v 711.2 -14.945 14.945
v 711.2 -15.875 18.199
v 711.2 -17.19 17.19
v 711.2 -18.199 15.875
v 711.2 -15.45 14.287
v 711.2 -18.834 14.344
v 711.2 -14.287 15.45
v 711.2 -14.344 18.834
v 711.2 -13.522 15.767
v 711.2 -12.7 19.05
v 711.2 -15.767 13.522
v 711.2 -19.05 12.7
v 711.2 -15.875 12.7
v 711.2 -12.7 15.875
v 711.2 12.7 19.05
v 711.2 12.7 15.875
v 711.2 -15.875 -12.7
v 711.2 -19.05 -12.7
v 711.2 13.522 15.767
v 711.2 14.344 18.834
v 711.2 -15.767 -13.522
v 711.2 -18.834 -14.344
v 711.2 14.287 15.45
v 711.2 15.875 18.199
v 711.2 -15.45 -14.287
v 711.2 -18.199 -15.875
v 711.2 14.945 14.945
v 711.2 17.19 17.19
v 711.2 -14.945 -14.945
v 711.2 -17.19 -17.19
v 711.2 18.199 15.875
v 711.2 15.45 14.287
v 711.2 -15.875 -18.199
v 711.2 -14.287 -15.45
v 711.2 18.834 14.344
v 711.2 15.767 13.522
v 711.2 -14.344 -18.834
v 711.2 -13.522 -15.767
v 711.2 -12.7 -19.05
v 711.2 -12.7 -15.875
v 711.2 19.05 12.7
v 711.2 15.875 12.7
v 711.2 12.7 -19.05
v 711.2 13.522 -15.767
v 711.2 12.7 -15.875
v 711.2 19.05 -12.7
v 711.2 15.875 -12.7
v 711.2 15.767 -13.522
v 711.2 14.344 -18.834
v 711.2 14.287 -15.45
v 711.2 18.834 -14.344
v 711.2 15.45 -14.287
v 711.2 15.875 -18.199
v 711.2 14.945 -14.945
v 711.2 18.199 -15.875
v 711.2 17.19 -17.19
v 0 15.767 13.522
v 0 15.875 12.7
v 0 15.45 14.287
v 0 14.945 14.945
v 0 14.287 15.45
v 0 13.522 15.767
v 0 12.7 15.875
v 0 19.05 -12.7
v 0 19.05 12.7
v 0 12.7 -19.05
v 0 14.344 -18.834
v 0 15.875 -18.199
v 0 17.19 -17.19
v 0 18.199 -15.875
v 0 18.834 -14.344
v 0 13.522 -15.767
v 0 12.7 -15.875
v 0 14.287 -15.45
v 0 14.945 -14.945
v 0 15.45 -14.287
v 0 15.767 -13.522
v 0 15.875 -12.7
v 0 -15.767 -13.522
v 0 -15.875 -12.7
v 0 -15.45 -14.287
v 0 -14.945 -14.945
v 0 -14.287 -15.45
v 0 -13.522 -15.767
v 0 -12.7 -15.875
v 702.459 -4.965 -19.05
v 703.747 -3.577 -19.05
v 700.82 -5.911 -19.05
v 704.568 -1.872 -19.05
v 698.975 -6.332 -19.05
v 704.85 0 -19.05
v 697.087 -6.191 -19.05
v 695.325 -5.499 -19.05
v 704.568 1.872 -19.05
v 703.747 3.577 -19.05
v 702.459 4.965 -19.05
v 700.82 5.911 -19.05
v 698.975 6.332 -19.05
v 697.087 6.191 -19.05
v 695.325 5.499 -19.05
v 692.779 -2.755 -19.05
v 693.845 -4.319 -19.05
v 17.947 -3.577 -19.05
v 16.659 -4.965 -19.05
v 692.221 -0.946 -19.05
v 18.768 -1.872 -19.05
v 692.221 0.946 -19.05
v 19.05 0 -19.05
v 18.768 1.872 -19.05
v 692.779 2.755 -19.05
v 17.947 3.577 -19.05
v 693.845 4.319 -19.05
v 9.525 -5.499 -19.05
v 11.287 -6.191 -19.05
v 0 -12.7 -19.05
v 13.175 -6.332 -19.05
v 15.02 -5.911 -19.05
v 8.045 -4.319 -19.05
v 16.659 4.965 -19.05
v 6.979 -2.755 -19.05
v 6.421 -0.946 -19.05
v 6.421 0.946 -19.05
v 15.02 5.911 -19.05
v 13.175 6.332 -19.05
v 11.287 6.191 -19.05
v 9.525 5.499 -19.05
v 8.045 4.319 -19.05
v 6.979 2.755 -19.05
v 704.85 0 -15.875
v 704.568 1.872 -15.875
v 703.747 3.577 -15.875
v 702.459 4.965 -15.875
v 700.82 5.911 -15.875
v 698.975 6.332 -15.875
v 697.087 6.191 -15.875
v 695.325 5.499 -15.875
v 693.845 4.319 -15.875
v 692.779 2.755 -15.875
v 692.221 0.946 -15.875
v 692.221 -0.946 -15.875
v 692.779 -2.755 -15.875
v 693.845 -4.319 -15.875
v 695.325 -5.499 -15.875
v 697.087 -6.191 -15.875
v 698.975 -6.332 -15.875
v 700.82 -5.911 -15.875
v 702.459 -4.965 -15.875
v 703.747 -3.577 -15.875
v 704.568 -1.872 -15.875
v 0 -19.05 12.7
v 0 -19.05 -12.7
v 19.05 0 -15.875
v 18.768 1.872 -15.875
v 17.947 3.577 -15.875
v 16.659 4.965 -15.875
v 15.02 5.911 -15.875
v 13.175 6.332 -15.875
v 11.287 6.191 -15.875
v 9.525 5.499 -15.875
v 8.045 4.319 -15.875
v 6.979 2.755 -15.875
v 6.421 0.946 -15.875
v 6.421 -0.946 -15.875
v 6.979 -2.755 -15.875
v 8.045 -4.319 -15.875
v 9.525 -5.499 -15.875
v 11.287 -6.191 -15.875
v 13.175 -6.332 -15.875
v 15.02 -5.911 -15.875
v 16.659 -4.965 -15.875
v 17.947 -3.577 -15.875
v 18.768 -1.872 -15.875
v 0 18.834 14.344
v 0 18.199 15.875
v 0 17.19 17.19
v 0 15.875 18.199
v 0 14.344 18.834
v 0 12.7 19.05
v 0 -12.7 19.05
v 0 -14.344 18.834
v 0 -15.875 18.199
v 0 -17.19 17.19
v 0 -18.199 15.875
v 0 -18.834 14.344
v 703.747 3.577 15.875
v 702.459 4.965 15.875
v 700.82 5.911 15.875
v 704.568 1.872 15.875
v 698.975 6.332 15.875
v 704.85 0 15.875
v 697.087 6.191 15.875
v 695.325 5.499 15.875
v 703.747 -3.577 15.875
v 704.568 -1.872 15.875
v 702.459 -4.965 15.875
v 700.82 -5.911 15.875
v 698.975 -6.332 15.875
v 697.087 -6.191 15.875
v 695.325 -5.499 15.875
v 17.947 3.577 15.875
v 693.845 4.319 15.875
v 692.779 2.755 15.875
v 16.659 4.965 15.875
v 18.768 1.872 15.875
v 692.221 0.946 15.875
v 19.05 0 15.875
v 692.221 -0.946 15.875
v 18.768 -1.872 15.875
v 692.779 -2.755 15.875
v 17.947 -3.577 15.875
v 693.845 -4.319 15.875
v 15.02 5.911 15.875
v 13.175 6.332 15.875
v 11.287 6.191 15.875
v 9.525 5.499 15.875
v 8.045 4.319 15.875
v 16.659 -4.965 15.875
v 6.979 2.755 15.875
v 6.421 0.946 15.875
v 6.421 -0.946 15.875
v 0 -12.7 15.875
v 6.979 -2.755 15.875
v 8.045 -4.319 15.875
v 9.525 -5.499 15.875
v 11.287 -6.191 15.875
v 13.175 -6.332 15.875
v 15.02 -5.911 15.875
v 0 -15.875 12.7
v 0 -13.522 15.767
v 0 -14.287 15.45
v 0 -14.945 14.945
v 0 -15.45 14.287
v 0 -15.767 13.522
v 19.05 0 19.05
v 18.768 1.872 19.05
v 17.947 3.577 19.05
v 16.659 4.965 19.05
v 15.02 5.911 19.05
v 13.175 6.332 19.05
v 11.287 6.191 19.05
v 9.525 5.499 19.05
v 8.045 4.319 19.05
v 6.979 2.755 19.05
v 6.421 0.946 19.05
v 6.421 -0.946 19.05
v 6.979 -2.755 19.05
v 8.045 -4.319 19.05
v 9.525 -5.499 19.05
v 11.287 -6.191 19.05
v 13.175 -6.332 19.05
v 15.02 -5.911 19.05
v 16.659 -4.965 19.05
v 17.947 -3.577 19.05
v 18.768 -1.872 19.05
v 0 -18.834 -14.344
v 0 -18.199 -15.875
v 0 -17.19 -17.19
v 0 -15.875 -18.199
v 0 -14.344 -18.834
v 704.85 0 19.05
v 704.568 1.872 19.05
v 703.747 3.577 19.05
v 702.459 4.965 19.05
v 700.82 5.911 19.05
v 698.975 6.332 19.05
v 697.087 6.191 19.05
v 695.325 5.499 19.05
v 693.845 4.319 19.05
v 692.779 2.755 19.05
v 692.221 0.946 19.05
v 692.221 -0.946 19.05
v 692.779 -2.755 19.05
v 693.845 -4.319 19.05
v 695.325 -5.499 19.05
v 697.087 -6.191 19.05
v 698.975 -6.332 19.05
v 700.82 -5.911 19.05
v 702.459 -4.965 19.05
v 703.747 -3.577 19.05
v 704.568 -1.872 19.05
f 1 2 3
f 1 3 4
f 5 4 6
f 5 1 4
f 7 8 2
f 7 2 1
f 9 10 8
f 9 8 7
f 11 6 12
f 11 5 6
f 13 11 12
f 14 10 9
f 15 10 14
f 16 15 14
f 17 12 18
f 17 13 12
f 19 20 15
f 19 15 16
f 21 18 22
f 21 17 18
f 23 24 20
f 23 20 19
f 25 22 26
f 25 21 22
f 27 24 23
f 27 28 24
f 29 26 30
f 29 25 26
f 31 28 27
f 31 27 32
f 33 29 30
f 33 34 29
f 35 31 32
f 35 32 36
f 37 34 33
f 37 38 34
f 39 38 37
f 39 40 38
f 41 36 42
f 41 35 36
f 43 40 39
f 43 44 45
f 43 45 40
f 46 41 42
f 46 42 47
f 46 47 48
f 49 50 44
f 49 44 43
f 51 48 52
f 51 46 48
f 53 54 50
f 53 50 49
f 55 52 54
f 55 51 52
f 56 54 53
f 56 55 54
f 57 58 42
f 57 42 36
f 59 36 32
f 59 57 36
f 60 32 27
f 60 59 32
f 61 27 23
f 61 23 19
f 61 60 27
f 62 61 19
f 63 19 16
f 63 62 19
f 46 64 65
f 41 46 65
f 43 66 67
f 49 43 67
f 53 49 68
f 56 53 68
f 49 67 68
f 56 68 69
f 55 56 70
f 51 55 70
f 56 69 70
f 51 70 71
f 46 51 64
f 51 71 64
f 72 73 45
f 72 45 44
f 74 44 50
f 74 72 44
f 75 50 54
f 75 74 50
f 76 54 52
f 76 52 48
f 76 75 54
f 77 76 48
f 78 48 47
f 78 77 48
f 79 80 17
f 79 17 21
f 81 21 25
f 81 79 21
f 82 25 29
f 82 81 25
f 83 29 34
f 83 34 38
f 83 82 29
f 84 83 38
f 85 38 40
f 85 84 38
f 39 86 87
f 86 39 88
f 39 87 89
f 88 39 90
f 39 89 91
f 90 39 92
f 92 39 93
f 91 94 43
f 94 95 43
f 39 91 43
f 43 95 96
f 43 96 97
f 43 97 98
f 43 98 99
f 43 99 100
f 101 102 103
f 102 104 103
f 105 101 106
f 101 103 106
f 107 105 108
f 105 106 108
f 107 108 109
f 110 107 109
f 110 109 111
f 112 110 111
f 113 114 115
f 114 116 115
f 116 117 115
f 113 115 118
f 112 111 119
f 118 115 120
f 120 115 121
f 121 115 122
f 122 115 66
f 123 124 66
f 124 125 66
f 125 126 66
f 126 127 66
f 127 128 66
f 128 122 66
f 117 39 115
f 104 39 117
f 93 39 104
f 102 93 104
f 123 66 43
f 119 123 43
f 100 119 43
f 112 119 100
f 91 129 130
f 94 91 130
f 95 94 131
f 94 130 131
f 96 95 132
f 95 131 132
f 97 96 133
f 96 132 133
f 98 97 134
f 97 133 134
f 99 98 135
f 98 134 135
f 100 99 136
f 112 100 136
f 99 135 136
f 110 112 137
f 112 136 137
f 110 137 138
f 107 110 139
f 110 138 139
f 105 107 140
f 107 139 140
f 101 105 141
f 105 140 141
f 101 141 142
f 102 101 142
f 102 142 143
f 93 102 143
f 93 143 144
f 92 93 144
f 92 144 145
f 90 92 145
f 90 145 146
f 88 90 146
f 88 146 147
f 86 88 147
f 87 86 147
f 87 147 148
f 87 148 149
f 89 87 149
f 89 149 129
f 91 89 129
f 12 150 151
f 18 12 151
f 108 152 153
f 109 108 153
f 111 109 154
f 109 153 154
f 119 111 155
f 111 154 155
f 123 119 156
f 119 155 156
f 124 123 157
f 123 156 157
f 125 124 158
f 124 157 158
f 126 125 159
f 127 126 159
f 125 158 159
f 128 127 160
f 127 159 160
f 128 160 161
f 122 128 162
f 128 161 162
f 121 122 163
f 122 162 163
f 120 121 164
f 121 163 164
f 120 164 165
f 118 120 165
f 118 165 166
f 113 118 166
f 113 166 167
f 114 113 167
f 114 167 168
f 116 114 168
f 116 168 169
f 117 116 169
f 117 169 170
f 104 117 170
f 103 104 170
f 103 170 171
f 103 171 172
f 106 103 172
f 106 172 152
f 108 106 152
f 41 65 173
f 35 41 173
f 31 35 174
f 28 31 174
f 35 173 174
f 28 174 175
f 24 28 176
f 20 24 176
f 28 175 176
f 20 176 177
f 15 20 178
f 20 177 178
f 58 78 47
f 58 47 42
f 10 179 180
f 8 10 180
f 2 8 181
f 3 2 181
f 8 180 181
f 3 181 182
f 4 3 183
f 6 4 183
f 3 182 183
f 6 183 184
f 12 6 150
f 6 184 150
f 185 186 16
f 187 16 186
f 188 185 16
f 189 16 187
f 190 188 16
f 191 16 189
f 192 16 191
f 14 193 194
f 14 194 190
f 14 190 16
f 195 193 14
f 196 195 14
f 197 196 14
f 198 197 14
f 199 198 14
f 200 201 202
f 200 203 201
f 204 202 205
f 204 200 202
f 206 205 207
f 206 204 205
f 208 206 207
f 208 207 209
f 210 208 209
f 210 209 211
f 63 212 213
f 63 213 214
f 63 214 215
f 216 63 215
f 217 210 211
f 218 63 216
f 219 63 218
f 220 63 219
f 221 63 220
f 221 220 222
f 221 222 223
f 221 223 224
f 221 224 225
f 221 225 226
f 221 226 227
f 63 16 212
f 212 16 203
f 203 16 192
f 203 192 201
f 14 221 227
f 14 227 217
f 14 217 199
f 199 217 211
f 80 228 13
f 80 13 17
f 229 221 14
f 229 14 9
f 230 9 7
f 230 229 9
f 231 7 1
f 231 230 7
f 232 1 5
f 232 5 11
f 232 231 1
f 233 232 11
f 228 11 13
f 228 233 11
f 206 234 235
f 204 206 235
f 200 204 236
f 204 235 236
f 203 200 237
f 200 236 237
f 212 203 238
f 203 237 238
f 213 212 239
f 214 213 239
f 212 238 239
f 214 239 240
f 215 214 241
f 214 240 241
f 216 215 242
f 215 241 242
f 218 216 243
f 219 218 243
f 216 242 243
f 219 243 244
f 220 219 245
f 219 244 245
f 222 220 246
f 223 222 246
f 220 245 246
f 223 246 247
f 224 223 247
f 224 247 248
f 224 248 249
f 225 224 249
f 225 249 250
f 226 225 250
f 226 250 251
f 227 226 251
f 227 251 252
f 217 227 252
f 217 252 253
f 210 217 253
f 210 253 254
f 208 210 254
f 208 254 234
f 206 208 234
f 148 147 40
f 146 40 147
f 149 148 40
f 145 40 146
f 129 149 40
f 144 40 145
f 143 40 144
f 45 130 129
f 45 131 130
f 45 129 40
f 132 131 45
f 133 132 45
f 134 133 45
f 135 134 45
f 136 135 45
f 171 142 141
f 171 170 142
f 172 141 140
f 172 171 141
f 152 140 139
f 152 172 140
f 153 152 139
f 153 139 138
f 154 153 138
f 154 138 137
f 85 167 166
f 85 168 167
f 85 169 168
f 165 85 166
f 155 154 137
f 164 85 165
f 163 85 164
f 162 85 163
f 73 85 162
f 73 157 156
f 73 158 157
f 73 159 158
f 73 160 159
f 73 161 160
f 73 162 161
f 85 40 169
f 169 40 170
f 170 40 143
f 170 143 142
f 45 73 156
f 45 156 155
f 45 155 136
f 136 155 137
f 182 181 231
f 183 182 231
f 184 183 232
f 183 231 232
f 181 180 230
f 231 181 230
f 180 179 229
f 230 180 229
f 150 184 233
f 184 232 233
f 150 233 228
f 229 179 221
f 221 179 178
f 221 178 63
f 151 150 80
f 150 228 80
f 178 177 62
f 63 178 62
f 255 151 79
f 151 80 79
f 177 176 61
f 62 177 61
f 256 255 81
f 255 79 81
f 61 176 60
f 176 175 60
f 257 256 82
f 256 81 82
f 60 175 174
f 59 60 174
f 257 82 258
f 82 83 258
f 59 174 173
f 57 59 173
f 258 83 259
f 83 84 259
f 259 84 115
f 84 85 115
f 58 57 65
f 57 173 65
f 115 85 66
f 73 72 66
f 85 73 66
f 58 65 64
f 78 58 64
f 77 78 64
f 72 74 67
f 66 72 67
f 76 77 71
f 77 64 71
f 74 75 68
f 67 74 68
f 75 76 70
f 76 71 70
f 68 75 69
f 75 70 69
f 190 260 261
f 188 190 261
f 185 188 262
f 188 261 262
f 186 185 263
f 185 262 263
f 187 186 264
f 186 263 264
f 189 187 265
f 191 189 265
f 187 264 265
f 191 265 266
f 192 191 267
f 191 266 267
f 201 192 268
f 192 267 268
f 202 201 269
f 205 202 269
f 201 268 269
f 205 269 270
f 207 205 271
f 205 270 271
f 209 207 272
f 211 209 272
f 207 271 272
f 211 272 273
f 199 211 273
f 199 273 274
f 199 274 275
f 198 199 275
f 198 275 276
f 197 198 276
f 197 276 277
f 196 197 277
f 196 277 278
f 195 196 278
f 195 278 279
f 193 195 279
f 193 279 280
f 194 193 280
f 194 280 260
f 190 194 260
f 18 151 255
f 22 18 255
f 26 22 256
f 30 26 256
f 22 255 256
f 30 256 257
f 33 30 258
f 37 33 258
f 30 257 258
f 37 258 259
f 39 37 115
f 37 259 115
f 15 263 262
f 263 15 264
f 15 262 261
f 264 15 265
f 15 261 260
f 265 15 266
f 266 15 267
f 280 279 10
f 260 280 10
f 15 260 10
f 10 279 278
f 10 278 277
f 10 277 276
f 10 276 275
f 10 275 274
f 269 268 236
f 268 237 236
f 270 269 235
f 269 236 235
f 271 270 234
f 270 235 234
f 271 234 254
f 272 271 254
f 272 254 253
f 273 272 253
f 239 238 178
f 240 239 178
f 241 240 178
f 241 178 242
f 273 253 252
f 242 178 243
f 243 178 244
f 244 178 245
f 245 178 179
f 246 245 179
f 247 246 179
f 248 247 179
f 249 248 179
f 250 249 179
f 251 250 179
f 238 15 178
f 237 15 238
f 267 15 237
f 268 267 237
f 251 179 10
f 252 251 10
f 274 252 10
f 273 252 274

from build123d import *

# Parameters (mm, degrees)
STRUCTURAL_MEMBER1_DEPTH = 711.2
SKETCH2_R                = 6.35
CUT_EXTRUDE1_DEPTH       = 713.474527615
SKETCH3_R                = 6.35
CUT_EXTRUDE2_DEPTH       = 713.474527615


with BuildPart() as part:
    # Sketch1 → Structural Member1 (new body)
    with BuildSketch(Plane(origin=(0, 0, 0), x_dir=(0, 0, -1), z_dir=(1, 0, 0))):
        with BuildLine():
            Line((-12.7, -19.05), (12.7, -19.05))
            ThreePointArc((12.7, -19.05), (17.190128061, -17.190128061), (19.05, -12.7))
            Line((19.05, -12.7), (19.05, 12.7))
            ThreePointArc((19.05, 12.7), (17.190128061, 17.190128061), (12.7, 19.05))
            Line((12.7, 19.05), (-12.7, 19.05))
            ThreePointArc((-12.7, 19.05), (-17.190128061, 17.190128061), (-19.05, 12.7))
            Line((-19.05, 12.7), (-19.05, -12.7))
            ThreePointArc((-19.05, -12.7), (-17.190128061, -17.190128061), (-12.7, -19.05))
        make_face()
        with BuildLine():
            Line((-12.7, -15.875), (12.7, -15.875))
            ThreePointArc((12.7, -15.875), (14.94506403, -14.94506403), (15.875, -12.7))
            Line((15.875, -12.7), (15.875, 12.7))
            ThreePointArc((15.875, 12.7), (14.94506403, 14.94506403), (12.7, 15.875))
            Line((12.7, 15.875), (-12.7, 15.875))
            ThreePointArc((-12.7, 15.875), (-14.94506403, 14.94506403), (-15.875, 12.7))
            Line((-15.875, 12.7), (-15.875, -12.7))
            ThreePointArc((-15.875, -12.7), (-14.94506403, -14.94506403), (-12.7, -15.875))
        make_face(mode=Mode.SUBTRACT)
    extrude(amount=STRUCTURAL_MEMBER1_DEPTH)

    # Sketch2 → Cut-Extrude1 (cut, through all)
    with BuildSketch(Plane.XY.offset(19.05)):
        with Locations((12.7, 0)):
            Circle(SKETCH2_R)
    extrude(amount=-CUT_EXTRUDE1_DEPTH, mode=Mode.SUBTRACT)

    # Sketch3 → Cut-Extrude2 (cut, through all)
    with BuildSketch(Plane.XY.offset(19.05)):
        with Locations((698.5, 0)):
            Circle(SKETCH3_R)
    extrude(amount=-CUT_EXTRUDE2_DEPTH, mode=Mode.SUBTRACT)


solid = part.part
